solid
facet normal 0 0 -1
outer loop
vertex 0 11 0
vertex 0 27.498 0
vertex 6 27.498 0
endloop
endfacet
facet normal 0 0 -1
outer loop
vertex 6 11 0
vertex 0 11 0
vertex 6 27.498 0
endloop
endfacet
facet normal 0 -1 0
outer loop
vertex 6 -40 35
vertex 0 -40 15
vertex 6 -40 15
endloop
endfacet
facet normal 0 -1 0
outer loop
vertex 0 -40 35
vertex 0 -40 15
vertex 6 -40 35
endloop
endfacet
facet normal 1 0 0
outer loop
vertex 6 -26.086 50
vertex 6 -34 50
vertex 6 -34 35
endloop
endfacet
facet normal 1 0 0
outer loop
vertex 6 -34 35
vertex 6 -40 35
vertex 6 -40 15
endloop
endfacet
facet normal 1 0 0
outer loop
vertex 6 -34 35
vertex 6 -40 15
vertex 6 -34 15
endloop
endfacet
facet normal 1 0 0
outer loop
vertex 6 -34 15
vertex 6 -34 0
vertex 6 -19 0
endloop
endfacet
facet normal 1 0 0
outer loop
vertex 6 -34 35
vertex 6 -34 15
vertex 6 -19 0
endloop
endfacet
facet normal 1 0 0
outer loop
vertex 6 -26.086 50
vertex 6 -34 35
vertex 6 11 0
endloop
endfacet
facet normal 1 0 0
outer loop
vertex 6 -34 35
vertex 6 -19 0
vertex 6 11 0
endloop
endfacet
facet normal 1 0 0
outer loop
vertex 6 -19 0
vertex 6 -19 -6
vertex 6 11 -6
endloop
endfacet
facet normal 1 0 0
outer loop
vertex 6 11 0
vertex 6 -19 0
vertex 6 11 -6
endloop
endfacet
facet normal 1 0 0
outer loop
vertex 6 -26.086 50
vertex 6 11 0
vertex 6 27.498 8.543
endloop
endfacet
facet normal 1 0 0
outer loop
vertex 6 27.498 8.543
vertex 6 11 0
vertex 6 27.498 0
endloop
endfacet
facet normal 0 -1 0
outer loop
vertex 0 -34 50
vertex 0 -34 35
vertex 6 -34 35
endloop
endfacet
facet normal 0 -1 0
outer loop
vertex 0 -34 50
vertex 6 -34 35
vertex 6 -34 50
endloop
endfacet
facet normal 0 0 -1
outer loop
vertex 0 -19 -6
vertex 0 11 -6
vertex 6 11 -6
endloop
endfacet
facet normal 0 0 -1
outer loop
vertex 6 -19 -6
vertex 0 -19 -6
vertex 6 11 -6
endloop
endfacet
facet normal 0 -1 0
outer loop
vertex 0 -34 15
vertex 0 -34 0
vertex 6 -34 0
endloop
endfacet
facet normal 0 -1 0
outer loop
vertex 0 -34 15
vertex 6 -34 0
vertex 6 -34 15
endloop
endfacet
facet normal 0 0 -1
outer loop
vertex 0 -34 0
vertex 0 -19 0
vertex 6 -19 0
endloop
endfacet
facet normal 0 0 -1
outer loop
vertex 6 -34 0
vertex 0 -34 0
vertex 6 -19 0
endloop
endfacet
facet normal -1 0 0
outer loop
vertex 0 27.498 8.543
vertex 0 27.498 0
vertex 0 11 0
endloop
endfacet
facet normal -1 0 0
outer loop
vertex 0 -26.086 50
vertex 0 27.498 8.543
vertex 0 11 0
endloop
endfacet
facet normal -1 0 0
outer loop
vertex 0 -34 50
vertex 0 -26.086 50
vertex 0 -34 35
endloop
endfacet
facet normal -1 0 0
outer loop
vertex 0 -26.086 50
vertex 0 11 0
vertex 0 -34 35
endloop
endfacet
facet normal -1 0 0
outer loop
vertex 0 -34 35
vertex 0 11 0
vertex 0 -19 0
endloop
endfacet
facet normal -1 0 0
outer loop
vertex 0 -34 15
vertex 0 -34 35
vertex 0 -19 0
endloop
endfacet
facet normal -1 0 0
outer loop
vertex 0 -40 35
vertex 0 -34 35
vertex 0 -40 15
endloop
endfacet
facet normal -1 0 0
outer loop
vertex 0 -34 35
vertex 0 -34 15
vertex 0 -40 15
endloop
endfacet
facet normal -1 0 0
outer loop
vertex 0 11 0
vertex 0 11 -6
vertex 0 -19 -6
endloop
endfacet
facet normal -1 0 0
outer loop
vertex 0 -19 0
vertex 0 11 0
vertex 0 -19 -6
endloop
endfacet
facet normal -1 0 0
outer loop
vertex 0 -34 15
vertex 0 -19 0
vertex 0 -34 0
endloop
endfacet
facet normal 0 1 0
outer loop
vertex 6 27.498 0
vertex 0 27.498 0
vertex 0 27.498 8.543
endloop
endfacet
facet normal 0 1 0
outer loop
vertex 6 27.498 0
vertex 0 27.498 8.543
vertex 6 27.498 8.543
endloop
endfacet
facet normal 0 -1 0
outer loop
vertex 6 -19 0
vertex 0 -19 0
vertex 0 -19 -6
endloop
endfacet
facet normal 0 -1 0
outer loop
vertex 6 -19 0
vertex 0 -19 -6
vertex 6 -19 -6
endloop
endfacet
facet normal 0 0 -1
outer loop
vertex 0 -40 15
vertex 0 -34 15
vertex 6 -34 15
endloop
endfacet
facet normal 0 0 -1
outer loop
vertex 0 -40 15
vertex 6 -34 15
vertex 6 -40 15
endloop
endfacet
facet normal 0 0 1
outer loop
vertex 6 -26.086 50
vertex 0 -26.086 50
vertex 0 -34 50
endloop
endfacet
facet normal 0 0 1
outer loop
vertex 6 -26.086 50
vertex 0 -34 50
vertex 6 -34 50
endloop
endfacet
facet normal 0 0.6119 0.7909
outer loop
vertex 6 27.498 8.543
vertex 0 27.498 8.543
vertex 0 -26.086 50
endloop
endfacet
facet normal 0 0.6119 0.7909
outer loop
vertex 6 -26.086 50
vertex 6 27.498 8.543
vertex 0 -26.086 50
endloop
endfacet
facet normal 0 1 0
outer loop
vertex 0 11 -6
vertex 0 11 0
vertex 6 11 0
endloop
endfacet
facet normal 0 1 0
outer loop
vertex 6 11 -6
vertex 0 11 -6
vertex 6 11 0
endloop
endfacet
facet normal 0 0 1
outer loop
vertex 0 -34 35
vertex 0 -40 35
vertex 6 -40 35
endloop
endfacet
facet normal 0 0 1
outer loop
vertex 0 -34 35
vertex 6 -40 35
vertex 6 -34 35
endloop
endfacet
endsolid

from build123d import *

# Parameters (mm, degrees)
SKETCH1_W           = 6
SKETCH1_H           = 67.498322337
BOSS_EXTRUDE1_DEPTH = 50
SKETCH1_3_W         = 6
SKETCH1_3_H         = 30
BOSS_EXTRUDE2_DEPTH = 6
CUT_EXTRUDE1_DEPTH  = 6
CUT_EXTRUDE2_DEPTH  = 6


with BuildPart() as part:
    # Sketch1 → Boss-Extrude1 (new body)
    with BuildSketch(Plane.XY):
        with Locations((3, -6.250838831)):
            Rectangle(SKETCH1_W, SKETCH1_H)
    extrude(amount=BOSS_EXTRUDE1_DEPTH)

    # Sketch1<3> → Boss-Extrude2 (add)
    with BuildSketch(Plane.XY):
        with Locations((3, -4)):
            Rectangle(SKETCH1_3_W, SKETCH1_3_H)
    extrude(amount=-BOSS_EXTRUDE2_DEPTH)

    # Sketch2 → Cut-Extrude1 (cut)
    with BuildSketch(Plane.ZY):
        Polygon((0, -34), (15, -34), (15, -40), (35, -40), (35, -34), (50, -34), (50, -43.159116413), (0, -43.159116413), align=None)
    extrude(amount=-CUT_EXTRUDE1_DEPTH, mode=Mode.SUBTRACT)

    # Sketch3 → Cut-Extrude2 (cut)
    with BuildSketch(Plane.ZY):
        Polygon((8.542523628, 27.498322337), (50, -26.085899573), (50, 27.498322337), align=None)
    extrude(amount=-CUT_EXTRUDE2_DEPTH, mode=Mode.SUBTRACT)


solid = part.part
